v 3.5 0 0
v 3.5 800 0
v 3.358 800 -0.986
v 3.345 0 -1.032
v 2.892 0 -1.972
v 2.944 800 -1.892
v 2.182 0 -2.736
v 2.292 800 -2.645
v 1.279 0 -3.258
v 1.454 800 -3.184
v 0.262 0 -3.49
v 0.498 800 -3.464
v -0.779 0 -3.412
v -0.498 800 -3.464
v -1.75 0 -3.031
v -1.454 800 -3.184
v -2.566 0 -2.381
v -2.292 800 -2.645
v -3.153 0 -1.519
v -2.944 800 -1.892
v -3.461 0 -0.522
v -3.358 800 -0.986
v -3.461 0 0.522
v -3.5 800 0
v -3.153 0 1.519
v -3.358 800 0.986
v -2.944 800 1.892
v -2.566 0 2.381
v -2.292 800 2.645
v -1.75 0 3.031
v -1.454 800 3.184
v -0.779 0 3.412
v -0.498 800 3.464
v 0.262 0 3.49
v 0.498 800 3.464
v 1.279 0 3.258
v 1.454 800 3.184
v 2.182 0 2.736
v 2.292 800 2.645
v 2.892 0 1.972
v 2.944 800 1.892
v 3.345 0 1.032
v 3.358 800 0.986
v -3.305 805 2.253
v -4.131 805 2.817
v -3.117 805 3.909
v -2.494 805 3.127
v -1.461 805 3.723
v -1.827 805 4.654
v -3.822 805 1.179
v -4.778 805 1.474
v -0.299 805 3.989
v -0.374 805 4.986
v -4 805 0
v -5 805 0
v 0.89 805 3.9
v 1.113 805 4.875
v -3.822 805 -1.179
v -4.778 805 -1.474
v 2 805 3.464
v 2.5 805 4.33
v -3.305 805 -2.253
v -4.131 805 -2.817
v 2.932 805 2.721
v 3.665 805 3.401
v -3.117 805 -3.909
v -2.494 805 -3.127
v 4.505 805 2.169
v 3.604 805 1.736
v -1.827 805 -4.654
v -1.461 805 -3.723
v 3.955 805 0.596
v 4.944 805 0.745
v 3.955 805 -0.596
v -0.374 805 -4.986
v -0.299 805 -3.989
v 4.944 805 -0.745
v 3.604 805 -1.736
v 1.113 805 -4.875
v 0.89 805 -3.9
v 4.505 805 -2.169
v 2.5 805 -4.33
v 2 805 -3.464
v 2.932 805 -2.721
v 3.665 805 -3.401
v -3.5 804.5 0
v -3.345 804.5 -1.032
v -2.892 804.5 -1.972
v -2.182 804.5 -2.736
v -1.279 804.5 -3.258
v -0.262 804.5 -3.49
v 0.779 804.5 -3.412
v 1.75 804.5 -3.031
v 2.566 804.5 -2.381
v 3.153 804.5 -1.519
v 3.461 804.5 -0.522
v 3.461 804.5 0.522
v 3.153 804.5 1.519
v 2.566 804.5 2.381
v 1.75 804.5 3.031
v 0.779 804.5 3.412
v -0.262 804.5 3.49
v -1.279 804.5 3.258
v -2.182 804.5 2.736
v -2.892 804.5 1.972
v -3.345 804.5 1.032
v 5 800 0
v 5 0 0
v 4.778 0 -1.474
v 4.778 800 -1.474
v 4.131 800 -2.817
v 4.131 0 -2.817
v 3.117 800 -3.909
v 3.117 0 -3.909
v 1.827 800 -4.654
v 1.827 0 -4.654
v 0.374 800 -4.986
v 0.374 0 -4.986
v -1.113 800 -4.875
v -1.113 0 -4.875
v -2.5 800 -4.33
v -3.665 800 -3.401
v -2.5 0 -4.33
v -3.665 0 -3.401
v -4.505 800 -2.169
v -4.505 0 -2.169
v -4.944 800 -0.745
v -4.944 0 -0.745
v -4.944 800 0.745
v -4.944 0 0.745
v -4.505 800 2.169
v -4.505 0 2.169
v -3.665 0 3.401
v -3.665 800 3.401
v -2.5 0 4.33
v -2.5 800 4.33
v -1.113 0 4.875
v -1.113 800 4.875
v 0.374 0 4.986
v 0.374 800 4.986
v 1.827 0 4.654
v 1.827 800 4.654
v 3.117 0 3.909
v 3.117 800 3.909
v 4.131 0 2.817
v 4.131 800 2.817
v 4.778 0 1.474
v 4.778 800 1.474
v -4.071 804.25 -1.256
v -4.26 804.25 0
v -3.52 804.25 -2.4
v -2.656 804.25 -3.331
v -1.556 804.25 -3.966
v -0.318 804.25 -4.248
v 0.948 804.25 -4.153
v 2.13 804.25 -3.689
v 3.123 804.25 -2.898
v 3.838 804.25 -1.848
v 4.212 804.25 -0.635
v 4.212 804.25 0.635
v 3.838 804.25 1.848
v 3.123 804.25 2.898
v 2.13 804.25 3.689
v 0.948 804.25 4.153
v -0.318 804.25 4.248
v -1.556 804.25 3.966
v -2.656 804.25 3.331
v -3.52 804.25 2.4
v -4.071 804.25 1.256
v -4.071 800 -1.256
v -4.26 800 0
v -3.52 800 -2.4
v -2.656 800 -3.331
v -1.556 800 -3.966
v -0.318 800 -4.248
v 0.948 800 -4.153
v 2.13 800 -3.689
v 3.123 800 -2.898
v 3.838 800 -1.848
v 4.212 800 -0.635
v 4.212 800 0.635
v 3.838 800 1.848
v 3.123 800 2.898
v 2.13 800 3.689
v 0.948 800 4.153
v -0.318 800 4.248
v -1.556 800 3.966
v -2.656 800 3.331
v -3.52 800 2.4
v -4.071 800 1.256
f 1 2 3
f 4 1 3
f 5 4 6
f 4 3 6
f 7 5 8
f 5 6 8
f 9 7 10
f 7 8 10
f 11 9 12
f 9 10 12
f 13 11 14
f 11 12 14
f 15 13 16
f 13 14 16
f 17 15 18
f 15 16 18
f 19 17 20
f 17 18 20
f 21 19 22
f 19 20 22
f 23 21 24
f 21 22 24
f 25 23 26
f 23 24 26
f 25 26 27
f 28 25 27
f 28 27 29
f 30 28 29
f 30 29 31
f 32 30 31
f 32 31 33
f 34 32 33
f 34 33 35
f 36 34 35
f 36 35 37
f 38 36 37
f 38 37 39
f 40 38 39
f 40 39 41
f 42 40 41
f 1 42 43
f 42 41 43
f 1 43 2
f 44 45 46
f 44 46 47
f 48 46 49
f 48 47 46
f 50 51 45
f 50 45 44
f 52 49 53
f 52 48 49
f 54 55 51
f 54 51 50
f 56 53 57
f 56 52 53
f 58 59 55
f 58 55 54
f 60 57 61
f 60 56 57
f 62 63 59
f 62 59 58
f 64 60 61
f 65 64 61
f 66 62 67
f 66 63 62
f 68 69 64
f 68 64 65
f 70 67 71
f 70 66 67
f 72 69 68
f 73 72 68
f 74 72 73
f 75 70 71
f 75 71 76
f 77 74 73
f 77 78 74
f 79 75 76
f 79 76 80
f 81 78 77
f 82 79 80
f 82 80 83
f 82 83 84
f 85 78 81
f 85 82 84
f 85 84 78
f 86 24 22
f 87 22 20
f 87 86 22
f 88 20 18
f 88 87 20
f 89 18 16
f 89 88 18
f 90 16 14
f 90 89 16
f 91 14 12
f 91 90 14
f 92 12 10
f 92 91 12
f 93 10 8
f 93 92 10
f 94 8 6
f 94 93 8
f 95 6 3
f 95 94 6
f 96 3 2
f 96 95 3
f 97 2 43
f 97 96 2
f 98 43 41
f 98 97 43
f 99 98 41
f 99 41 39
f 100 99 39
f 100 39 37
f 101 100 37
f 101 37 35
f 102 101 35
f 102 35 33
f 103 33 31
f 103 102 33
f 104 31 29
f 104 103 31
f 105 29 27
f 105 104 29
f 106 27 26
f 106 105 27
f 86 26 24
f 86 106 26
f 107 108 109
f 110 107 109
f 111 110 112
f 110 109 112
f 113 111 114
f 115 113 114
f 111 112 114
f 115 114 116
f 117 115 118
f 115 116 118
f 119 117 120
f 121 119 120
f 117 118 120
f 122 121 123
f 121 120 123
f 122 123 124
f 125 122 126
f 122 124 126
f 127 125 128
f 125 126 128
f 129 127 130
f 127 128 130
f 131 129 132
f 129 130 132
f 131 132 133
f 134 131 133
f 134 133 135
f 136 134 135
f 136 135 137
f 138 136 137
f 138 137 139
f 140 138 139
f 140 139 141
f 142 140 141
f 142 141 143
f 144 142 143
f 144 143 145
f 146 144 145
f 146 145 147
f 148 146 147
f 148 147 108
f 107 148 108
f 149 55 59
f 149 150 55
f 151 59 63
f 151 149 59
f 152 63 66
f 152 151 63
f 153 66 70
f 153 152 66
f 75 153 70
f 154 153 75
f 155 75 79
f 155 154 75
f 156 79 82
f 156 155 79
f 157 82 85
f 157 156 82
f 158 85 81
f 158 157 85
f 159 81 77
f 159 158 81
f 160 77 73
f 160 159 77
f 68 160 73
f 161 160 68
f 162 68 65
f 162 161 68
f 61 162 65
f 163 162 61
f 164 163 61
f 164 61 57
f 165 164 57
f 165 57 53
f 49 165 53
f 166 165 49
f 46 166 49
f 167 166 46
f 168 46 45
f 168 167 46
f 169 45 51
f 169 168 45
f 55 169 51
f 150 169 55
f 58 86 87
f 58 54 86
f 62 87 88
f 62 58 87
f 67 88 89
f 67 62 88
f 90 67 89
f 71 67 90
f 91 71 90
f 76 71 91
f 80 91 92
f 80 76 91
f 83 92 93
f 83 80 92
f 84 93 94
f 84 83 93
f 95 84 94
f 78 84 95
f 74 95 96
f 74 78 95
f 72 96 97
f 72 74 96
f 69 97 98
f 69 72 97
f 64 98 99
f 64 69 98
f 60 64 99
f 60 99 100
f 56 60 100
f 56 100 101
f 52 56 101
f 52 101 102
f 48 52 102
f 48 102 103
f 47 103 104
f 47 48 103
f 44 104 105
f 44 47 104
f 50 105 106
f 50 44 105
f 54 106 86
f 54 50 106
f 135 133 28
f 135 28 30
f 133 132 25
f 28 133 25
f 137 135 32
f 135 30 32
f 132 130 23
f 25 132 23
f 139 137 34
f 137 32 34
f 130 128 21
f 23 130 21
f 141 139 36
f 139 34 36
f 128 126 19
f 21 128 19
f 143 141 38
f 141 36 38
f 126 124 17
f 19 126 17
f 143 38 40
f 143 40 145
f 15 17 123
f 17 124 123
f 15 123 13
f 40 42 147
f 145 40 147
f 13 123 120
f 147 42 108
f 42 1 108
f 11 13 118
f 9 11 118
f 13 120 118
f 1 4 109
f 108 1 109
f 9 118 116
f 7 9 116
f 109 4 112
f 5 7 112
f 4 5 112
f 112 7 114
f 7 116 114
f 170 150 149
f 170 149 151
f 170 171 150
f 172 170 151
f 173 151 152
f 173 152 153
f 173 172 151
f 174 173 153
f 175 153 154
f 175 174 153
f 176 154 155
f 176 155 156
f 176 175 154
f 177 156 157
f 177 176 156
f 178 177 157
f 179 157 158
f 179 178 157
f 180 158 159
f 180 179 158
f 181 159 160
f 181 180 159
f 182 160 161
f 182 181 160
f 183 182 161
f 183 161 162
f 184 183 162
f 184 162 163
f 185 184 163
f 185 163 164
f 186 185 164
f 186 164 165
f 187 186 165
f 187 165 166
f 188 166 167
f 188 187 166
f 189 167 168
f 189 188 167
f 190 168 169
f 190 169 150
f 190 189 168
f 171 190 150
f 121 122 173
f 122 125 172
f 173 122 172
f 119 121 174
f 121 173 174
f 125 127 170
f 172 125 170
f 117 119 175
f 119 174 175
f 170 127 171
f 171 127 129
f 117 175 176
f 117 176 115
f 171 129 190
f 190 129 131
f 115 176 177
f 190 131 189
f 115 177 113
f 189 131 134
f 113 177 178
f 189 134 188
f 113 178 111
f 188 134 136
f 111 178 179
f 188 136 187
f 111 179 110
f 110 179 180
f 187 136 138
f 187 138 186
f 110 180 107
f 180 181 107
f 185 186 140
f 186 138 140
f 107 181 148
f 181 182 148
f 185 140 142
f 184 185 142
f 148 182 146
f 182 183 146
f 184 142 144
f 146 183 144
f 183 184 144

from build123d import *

# Parameters (mm, degrees)
CROQUIS1_R                 = 5
SALIENTE_EXTRUIR1_DEPTH    = 800
CROQUIS2_R                 = 3.5
CORTAR_EXTRUIR1_DEPTH      = 801
CROQUIS3_R                 = 6
SALIENTE_EXTRUIR2_DEPTH    = 1
CROQUIS4_R                 = 3.5
CORTAR_EXTRUIR3_DEPTH      = 1
CHAFL_N1_SIZE              = 1
CROQUIS5_W                 = 13.367882917
CROQUIS5_H                 = 1.687826657
CORTAR_EXTRUIR4_DEPTH      = 7
CORTAR_EXTRUIR4_DEPTH_BACK = 7


with BuildPart() as part:
    # Croquis1 → Saliente-Extruir1 (new body)
    with BuildSketch(Plane(origin=(0, 0, 0), x_dir=(1, 0, 0), z_dir=(0, 1, 0))):
        Circle(CROQUIS1_R)
    extrude(amount=SALIENTE_EXTRUIR1_DEPTH)

    # Croquis2 → Cortar-Extruir1 (cut, through all)
    with BuildSketch(Plane.XZ):
        Circle(CROQUIS2_R)
    extrude(amount=-CORTAR_EXTRUIR1_DEPTH, mode=Mode.SUBTRACT)

    # Croquis3 → Saliente-Extruir2 (add)
    with BuildSketch(Plane(origin=(0, 800, 0), x_dir=(1, 0, 0), z_dir=(0, 1, 0))):
        Circle(CROQUIS3_R)
    extrude(amount=SALIENTE_EXTRUIR2_DEPTH)

    # Croquis4 → Cortar-Extruir3 (cut)
    with BuildSketch(Plane(origin=(0, 801, 0), x_dir=(1, 0, 0), z_dir=(0, 1, 0))):
        Circle(CROQUIS4_R)
    extrude(amount=-CORTAR_EXTRUIR3_DEPTH, mode=Mode.SUBTRACT)

    # Chaflán1
    chafl_n1_edges = [part.edges().sort_by_distance(p)[0] for p in [
        (-3.5, 801, 0),
    ]]
    chamfer(chafl_n1_edges, length=CHAFL_N1_SIZE)

    # Croquis5 → Cortar-Extruir4 (cut, two sides)
    with BuildSketch(Plane.XY) as cortar_extruir4_sk:
        with Locations((0.334446828, 800.843913329)):
            Rectangle(CROQUIS5_W, CROQUIS5_H)
    extrude(amount=CORTAR_EXTRUIR4_DEPTH, mode=Mode.SUBTRACT)
    extrude(cortar_extruir4_sk.sketch, amount=-CORTAR_EXTRUIR4_DEPTH_BACK, mode=Mode.SUBTRACT)

    # Croquis6 → Revolución1 (revolve)
    with BuildSketch(Plane.XY):
        Polygon((-3.5, 800), (-3.5, 804.5), (-4, 805), (-5, 805), (-4.26, 804.25), (-4.26, 800), align=None)
    revolve(axis=Axis((0, 810.031166981, 0), (0, -1, 0)))


solid = part.part
